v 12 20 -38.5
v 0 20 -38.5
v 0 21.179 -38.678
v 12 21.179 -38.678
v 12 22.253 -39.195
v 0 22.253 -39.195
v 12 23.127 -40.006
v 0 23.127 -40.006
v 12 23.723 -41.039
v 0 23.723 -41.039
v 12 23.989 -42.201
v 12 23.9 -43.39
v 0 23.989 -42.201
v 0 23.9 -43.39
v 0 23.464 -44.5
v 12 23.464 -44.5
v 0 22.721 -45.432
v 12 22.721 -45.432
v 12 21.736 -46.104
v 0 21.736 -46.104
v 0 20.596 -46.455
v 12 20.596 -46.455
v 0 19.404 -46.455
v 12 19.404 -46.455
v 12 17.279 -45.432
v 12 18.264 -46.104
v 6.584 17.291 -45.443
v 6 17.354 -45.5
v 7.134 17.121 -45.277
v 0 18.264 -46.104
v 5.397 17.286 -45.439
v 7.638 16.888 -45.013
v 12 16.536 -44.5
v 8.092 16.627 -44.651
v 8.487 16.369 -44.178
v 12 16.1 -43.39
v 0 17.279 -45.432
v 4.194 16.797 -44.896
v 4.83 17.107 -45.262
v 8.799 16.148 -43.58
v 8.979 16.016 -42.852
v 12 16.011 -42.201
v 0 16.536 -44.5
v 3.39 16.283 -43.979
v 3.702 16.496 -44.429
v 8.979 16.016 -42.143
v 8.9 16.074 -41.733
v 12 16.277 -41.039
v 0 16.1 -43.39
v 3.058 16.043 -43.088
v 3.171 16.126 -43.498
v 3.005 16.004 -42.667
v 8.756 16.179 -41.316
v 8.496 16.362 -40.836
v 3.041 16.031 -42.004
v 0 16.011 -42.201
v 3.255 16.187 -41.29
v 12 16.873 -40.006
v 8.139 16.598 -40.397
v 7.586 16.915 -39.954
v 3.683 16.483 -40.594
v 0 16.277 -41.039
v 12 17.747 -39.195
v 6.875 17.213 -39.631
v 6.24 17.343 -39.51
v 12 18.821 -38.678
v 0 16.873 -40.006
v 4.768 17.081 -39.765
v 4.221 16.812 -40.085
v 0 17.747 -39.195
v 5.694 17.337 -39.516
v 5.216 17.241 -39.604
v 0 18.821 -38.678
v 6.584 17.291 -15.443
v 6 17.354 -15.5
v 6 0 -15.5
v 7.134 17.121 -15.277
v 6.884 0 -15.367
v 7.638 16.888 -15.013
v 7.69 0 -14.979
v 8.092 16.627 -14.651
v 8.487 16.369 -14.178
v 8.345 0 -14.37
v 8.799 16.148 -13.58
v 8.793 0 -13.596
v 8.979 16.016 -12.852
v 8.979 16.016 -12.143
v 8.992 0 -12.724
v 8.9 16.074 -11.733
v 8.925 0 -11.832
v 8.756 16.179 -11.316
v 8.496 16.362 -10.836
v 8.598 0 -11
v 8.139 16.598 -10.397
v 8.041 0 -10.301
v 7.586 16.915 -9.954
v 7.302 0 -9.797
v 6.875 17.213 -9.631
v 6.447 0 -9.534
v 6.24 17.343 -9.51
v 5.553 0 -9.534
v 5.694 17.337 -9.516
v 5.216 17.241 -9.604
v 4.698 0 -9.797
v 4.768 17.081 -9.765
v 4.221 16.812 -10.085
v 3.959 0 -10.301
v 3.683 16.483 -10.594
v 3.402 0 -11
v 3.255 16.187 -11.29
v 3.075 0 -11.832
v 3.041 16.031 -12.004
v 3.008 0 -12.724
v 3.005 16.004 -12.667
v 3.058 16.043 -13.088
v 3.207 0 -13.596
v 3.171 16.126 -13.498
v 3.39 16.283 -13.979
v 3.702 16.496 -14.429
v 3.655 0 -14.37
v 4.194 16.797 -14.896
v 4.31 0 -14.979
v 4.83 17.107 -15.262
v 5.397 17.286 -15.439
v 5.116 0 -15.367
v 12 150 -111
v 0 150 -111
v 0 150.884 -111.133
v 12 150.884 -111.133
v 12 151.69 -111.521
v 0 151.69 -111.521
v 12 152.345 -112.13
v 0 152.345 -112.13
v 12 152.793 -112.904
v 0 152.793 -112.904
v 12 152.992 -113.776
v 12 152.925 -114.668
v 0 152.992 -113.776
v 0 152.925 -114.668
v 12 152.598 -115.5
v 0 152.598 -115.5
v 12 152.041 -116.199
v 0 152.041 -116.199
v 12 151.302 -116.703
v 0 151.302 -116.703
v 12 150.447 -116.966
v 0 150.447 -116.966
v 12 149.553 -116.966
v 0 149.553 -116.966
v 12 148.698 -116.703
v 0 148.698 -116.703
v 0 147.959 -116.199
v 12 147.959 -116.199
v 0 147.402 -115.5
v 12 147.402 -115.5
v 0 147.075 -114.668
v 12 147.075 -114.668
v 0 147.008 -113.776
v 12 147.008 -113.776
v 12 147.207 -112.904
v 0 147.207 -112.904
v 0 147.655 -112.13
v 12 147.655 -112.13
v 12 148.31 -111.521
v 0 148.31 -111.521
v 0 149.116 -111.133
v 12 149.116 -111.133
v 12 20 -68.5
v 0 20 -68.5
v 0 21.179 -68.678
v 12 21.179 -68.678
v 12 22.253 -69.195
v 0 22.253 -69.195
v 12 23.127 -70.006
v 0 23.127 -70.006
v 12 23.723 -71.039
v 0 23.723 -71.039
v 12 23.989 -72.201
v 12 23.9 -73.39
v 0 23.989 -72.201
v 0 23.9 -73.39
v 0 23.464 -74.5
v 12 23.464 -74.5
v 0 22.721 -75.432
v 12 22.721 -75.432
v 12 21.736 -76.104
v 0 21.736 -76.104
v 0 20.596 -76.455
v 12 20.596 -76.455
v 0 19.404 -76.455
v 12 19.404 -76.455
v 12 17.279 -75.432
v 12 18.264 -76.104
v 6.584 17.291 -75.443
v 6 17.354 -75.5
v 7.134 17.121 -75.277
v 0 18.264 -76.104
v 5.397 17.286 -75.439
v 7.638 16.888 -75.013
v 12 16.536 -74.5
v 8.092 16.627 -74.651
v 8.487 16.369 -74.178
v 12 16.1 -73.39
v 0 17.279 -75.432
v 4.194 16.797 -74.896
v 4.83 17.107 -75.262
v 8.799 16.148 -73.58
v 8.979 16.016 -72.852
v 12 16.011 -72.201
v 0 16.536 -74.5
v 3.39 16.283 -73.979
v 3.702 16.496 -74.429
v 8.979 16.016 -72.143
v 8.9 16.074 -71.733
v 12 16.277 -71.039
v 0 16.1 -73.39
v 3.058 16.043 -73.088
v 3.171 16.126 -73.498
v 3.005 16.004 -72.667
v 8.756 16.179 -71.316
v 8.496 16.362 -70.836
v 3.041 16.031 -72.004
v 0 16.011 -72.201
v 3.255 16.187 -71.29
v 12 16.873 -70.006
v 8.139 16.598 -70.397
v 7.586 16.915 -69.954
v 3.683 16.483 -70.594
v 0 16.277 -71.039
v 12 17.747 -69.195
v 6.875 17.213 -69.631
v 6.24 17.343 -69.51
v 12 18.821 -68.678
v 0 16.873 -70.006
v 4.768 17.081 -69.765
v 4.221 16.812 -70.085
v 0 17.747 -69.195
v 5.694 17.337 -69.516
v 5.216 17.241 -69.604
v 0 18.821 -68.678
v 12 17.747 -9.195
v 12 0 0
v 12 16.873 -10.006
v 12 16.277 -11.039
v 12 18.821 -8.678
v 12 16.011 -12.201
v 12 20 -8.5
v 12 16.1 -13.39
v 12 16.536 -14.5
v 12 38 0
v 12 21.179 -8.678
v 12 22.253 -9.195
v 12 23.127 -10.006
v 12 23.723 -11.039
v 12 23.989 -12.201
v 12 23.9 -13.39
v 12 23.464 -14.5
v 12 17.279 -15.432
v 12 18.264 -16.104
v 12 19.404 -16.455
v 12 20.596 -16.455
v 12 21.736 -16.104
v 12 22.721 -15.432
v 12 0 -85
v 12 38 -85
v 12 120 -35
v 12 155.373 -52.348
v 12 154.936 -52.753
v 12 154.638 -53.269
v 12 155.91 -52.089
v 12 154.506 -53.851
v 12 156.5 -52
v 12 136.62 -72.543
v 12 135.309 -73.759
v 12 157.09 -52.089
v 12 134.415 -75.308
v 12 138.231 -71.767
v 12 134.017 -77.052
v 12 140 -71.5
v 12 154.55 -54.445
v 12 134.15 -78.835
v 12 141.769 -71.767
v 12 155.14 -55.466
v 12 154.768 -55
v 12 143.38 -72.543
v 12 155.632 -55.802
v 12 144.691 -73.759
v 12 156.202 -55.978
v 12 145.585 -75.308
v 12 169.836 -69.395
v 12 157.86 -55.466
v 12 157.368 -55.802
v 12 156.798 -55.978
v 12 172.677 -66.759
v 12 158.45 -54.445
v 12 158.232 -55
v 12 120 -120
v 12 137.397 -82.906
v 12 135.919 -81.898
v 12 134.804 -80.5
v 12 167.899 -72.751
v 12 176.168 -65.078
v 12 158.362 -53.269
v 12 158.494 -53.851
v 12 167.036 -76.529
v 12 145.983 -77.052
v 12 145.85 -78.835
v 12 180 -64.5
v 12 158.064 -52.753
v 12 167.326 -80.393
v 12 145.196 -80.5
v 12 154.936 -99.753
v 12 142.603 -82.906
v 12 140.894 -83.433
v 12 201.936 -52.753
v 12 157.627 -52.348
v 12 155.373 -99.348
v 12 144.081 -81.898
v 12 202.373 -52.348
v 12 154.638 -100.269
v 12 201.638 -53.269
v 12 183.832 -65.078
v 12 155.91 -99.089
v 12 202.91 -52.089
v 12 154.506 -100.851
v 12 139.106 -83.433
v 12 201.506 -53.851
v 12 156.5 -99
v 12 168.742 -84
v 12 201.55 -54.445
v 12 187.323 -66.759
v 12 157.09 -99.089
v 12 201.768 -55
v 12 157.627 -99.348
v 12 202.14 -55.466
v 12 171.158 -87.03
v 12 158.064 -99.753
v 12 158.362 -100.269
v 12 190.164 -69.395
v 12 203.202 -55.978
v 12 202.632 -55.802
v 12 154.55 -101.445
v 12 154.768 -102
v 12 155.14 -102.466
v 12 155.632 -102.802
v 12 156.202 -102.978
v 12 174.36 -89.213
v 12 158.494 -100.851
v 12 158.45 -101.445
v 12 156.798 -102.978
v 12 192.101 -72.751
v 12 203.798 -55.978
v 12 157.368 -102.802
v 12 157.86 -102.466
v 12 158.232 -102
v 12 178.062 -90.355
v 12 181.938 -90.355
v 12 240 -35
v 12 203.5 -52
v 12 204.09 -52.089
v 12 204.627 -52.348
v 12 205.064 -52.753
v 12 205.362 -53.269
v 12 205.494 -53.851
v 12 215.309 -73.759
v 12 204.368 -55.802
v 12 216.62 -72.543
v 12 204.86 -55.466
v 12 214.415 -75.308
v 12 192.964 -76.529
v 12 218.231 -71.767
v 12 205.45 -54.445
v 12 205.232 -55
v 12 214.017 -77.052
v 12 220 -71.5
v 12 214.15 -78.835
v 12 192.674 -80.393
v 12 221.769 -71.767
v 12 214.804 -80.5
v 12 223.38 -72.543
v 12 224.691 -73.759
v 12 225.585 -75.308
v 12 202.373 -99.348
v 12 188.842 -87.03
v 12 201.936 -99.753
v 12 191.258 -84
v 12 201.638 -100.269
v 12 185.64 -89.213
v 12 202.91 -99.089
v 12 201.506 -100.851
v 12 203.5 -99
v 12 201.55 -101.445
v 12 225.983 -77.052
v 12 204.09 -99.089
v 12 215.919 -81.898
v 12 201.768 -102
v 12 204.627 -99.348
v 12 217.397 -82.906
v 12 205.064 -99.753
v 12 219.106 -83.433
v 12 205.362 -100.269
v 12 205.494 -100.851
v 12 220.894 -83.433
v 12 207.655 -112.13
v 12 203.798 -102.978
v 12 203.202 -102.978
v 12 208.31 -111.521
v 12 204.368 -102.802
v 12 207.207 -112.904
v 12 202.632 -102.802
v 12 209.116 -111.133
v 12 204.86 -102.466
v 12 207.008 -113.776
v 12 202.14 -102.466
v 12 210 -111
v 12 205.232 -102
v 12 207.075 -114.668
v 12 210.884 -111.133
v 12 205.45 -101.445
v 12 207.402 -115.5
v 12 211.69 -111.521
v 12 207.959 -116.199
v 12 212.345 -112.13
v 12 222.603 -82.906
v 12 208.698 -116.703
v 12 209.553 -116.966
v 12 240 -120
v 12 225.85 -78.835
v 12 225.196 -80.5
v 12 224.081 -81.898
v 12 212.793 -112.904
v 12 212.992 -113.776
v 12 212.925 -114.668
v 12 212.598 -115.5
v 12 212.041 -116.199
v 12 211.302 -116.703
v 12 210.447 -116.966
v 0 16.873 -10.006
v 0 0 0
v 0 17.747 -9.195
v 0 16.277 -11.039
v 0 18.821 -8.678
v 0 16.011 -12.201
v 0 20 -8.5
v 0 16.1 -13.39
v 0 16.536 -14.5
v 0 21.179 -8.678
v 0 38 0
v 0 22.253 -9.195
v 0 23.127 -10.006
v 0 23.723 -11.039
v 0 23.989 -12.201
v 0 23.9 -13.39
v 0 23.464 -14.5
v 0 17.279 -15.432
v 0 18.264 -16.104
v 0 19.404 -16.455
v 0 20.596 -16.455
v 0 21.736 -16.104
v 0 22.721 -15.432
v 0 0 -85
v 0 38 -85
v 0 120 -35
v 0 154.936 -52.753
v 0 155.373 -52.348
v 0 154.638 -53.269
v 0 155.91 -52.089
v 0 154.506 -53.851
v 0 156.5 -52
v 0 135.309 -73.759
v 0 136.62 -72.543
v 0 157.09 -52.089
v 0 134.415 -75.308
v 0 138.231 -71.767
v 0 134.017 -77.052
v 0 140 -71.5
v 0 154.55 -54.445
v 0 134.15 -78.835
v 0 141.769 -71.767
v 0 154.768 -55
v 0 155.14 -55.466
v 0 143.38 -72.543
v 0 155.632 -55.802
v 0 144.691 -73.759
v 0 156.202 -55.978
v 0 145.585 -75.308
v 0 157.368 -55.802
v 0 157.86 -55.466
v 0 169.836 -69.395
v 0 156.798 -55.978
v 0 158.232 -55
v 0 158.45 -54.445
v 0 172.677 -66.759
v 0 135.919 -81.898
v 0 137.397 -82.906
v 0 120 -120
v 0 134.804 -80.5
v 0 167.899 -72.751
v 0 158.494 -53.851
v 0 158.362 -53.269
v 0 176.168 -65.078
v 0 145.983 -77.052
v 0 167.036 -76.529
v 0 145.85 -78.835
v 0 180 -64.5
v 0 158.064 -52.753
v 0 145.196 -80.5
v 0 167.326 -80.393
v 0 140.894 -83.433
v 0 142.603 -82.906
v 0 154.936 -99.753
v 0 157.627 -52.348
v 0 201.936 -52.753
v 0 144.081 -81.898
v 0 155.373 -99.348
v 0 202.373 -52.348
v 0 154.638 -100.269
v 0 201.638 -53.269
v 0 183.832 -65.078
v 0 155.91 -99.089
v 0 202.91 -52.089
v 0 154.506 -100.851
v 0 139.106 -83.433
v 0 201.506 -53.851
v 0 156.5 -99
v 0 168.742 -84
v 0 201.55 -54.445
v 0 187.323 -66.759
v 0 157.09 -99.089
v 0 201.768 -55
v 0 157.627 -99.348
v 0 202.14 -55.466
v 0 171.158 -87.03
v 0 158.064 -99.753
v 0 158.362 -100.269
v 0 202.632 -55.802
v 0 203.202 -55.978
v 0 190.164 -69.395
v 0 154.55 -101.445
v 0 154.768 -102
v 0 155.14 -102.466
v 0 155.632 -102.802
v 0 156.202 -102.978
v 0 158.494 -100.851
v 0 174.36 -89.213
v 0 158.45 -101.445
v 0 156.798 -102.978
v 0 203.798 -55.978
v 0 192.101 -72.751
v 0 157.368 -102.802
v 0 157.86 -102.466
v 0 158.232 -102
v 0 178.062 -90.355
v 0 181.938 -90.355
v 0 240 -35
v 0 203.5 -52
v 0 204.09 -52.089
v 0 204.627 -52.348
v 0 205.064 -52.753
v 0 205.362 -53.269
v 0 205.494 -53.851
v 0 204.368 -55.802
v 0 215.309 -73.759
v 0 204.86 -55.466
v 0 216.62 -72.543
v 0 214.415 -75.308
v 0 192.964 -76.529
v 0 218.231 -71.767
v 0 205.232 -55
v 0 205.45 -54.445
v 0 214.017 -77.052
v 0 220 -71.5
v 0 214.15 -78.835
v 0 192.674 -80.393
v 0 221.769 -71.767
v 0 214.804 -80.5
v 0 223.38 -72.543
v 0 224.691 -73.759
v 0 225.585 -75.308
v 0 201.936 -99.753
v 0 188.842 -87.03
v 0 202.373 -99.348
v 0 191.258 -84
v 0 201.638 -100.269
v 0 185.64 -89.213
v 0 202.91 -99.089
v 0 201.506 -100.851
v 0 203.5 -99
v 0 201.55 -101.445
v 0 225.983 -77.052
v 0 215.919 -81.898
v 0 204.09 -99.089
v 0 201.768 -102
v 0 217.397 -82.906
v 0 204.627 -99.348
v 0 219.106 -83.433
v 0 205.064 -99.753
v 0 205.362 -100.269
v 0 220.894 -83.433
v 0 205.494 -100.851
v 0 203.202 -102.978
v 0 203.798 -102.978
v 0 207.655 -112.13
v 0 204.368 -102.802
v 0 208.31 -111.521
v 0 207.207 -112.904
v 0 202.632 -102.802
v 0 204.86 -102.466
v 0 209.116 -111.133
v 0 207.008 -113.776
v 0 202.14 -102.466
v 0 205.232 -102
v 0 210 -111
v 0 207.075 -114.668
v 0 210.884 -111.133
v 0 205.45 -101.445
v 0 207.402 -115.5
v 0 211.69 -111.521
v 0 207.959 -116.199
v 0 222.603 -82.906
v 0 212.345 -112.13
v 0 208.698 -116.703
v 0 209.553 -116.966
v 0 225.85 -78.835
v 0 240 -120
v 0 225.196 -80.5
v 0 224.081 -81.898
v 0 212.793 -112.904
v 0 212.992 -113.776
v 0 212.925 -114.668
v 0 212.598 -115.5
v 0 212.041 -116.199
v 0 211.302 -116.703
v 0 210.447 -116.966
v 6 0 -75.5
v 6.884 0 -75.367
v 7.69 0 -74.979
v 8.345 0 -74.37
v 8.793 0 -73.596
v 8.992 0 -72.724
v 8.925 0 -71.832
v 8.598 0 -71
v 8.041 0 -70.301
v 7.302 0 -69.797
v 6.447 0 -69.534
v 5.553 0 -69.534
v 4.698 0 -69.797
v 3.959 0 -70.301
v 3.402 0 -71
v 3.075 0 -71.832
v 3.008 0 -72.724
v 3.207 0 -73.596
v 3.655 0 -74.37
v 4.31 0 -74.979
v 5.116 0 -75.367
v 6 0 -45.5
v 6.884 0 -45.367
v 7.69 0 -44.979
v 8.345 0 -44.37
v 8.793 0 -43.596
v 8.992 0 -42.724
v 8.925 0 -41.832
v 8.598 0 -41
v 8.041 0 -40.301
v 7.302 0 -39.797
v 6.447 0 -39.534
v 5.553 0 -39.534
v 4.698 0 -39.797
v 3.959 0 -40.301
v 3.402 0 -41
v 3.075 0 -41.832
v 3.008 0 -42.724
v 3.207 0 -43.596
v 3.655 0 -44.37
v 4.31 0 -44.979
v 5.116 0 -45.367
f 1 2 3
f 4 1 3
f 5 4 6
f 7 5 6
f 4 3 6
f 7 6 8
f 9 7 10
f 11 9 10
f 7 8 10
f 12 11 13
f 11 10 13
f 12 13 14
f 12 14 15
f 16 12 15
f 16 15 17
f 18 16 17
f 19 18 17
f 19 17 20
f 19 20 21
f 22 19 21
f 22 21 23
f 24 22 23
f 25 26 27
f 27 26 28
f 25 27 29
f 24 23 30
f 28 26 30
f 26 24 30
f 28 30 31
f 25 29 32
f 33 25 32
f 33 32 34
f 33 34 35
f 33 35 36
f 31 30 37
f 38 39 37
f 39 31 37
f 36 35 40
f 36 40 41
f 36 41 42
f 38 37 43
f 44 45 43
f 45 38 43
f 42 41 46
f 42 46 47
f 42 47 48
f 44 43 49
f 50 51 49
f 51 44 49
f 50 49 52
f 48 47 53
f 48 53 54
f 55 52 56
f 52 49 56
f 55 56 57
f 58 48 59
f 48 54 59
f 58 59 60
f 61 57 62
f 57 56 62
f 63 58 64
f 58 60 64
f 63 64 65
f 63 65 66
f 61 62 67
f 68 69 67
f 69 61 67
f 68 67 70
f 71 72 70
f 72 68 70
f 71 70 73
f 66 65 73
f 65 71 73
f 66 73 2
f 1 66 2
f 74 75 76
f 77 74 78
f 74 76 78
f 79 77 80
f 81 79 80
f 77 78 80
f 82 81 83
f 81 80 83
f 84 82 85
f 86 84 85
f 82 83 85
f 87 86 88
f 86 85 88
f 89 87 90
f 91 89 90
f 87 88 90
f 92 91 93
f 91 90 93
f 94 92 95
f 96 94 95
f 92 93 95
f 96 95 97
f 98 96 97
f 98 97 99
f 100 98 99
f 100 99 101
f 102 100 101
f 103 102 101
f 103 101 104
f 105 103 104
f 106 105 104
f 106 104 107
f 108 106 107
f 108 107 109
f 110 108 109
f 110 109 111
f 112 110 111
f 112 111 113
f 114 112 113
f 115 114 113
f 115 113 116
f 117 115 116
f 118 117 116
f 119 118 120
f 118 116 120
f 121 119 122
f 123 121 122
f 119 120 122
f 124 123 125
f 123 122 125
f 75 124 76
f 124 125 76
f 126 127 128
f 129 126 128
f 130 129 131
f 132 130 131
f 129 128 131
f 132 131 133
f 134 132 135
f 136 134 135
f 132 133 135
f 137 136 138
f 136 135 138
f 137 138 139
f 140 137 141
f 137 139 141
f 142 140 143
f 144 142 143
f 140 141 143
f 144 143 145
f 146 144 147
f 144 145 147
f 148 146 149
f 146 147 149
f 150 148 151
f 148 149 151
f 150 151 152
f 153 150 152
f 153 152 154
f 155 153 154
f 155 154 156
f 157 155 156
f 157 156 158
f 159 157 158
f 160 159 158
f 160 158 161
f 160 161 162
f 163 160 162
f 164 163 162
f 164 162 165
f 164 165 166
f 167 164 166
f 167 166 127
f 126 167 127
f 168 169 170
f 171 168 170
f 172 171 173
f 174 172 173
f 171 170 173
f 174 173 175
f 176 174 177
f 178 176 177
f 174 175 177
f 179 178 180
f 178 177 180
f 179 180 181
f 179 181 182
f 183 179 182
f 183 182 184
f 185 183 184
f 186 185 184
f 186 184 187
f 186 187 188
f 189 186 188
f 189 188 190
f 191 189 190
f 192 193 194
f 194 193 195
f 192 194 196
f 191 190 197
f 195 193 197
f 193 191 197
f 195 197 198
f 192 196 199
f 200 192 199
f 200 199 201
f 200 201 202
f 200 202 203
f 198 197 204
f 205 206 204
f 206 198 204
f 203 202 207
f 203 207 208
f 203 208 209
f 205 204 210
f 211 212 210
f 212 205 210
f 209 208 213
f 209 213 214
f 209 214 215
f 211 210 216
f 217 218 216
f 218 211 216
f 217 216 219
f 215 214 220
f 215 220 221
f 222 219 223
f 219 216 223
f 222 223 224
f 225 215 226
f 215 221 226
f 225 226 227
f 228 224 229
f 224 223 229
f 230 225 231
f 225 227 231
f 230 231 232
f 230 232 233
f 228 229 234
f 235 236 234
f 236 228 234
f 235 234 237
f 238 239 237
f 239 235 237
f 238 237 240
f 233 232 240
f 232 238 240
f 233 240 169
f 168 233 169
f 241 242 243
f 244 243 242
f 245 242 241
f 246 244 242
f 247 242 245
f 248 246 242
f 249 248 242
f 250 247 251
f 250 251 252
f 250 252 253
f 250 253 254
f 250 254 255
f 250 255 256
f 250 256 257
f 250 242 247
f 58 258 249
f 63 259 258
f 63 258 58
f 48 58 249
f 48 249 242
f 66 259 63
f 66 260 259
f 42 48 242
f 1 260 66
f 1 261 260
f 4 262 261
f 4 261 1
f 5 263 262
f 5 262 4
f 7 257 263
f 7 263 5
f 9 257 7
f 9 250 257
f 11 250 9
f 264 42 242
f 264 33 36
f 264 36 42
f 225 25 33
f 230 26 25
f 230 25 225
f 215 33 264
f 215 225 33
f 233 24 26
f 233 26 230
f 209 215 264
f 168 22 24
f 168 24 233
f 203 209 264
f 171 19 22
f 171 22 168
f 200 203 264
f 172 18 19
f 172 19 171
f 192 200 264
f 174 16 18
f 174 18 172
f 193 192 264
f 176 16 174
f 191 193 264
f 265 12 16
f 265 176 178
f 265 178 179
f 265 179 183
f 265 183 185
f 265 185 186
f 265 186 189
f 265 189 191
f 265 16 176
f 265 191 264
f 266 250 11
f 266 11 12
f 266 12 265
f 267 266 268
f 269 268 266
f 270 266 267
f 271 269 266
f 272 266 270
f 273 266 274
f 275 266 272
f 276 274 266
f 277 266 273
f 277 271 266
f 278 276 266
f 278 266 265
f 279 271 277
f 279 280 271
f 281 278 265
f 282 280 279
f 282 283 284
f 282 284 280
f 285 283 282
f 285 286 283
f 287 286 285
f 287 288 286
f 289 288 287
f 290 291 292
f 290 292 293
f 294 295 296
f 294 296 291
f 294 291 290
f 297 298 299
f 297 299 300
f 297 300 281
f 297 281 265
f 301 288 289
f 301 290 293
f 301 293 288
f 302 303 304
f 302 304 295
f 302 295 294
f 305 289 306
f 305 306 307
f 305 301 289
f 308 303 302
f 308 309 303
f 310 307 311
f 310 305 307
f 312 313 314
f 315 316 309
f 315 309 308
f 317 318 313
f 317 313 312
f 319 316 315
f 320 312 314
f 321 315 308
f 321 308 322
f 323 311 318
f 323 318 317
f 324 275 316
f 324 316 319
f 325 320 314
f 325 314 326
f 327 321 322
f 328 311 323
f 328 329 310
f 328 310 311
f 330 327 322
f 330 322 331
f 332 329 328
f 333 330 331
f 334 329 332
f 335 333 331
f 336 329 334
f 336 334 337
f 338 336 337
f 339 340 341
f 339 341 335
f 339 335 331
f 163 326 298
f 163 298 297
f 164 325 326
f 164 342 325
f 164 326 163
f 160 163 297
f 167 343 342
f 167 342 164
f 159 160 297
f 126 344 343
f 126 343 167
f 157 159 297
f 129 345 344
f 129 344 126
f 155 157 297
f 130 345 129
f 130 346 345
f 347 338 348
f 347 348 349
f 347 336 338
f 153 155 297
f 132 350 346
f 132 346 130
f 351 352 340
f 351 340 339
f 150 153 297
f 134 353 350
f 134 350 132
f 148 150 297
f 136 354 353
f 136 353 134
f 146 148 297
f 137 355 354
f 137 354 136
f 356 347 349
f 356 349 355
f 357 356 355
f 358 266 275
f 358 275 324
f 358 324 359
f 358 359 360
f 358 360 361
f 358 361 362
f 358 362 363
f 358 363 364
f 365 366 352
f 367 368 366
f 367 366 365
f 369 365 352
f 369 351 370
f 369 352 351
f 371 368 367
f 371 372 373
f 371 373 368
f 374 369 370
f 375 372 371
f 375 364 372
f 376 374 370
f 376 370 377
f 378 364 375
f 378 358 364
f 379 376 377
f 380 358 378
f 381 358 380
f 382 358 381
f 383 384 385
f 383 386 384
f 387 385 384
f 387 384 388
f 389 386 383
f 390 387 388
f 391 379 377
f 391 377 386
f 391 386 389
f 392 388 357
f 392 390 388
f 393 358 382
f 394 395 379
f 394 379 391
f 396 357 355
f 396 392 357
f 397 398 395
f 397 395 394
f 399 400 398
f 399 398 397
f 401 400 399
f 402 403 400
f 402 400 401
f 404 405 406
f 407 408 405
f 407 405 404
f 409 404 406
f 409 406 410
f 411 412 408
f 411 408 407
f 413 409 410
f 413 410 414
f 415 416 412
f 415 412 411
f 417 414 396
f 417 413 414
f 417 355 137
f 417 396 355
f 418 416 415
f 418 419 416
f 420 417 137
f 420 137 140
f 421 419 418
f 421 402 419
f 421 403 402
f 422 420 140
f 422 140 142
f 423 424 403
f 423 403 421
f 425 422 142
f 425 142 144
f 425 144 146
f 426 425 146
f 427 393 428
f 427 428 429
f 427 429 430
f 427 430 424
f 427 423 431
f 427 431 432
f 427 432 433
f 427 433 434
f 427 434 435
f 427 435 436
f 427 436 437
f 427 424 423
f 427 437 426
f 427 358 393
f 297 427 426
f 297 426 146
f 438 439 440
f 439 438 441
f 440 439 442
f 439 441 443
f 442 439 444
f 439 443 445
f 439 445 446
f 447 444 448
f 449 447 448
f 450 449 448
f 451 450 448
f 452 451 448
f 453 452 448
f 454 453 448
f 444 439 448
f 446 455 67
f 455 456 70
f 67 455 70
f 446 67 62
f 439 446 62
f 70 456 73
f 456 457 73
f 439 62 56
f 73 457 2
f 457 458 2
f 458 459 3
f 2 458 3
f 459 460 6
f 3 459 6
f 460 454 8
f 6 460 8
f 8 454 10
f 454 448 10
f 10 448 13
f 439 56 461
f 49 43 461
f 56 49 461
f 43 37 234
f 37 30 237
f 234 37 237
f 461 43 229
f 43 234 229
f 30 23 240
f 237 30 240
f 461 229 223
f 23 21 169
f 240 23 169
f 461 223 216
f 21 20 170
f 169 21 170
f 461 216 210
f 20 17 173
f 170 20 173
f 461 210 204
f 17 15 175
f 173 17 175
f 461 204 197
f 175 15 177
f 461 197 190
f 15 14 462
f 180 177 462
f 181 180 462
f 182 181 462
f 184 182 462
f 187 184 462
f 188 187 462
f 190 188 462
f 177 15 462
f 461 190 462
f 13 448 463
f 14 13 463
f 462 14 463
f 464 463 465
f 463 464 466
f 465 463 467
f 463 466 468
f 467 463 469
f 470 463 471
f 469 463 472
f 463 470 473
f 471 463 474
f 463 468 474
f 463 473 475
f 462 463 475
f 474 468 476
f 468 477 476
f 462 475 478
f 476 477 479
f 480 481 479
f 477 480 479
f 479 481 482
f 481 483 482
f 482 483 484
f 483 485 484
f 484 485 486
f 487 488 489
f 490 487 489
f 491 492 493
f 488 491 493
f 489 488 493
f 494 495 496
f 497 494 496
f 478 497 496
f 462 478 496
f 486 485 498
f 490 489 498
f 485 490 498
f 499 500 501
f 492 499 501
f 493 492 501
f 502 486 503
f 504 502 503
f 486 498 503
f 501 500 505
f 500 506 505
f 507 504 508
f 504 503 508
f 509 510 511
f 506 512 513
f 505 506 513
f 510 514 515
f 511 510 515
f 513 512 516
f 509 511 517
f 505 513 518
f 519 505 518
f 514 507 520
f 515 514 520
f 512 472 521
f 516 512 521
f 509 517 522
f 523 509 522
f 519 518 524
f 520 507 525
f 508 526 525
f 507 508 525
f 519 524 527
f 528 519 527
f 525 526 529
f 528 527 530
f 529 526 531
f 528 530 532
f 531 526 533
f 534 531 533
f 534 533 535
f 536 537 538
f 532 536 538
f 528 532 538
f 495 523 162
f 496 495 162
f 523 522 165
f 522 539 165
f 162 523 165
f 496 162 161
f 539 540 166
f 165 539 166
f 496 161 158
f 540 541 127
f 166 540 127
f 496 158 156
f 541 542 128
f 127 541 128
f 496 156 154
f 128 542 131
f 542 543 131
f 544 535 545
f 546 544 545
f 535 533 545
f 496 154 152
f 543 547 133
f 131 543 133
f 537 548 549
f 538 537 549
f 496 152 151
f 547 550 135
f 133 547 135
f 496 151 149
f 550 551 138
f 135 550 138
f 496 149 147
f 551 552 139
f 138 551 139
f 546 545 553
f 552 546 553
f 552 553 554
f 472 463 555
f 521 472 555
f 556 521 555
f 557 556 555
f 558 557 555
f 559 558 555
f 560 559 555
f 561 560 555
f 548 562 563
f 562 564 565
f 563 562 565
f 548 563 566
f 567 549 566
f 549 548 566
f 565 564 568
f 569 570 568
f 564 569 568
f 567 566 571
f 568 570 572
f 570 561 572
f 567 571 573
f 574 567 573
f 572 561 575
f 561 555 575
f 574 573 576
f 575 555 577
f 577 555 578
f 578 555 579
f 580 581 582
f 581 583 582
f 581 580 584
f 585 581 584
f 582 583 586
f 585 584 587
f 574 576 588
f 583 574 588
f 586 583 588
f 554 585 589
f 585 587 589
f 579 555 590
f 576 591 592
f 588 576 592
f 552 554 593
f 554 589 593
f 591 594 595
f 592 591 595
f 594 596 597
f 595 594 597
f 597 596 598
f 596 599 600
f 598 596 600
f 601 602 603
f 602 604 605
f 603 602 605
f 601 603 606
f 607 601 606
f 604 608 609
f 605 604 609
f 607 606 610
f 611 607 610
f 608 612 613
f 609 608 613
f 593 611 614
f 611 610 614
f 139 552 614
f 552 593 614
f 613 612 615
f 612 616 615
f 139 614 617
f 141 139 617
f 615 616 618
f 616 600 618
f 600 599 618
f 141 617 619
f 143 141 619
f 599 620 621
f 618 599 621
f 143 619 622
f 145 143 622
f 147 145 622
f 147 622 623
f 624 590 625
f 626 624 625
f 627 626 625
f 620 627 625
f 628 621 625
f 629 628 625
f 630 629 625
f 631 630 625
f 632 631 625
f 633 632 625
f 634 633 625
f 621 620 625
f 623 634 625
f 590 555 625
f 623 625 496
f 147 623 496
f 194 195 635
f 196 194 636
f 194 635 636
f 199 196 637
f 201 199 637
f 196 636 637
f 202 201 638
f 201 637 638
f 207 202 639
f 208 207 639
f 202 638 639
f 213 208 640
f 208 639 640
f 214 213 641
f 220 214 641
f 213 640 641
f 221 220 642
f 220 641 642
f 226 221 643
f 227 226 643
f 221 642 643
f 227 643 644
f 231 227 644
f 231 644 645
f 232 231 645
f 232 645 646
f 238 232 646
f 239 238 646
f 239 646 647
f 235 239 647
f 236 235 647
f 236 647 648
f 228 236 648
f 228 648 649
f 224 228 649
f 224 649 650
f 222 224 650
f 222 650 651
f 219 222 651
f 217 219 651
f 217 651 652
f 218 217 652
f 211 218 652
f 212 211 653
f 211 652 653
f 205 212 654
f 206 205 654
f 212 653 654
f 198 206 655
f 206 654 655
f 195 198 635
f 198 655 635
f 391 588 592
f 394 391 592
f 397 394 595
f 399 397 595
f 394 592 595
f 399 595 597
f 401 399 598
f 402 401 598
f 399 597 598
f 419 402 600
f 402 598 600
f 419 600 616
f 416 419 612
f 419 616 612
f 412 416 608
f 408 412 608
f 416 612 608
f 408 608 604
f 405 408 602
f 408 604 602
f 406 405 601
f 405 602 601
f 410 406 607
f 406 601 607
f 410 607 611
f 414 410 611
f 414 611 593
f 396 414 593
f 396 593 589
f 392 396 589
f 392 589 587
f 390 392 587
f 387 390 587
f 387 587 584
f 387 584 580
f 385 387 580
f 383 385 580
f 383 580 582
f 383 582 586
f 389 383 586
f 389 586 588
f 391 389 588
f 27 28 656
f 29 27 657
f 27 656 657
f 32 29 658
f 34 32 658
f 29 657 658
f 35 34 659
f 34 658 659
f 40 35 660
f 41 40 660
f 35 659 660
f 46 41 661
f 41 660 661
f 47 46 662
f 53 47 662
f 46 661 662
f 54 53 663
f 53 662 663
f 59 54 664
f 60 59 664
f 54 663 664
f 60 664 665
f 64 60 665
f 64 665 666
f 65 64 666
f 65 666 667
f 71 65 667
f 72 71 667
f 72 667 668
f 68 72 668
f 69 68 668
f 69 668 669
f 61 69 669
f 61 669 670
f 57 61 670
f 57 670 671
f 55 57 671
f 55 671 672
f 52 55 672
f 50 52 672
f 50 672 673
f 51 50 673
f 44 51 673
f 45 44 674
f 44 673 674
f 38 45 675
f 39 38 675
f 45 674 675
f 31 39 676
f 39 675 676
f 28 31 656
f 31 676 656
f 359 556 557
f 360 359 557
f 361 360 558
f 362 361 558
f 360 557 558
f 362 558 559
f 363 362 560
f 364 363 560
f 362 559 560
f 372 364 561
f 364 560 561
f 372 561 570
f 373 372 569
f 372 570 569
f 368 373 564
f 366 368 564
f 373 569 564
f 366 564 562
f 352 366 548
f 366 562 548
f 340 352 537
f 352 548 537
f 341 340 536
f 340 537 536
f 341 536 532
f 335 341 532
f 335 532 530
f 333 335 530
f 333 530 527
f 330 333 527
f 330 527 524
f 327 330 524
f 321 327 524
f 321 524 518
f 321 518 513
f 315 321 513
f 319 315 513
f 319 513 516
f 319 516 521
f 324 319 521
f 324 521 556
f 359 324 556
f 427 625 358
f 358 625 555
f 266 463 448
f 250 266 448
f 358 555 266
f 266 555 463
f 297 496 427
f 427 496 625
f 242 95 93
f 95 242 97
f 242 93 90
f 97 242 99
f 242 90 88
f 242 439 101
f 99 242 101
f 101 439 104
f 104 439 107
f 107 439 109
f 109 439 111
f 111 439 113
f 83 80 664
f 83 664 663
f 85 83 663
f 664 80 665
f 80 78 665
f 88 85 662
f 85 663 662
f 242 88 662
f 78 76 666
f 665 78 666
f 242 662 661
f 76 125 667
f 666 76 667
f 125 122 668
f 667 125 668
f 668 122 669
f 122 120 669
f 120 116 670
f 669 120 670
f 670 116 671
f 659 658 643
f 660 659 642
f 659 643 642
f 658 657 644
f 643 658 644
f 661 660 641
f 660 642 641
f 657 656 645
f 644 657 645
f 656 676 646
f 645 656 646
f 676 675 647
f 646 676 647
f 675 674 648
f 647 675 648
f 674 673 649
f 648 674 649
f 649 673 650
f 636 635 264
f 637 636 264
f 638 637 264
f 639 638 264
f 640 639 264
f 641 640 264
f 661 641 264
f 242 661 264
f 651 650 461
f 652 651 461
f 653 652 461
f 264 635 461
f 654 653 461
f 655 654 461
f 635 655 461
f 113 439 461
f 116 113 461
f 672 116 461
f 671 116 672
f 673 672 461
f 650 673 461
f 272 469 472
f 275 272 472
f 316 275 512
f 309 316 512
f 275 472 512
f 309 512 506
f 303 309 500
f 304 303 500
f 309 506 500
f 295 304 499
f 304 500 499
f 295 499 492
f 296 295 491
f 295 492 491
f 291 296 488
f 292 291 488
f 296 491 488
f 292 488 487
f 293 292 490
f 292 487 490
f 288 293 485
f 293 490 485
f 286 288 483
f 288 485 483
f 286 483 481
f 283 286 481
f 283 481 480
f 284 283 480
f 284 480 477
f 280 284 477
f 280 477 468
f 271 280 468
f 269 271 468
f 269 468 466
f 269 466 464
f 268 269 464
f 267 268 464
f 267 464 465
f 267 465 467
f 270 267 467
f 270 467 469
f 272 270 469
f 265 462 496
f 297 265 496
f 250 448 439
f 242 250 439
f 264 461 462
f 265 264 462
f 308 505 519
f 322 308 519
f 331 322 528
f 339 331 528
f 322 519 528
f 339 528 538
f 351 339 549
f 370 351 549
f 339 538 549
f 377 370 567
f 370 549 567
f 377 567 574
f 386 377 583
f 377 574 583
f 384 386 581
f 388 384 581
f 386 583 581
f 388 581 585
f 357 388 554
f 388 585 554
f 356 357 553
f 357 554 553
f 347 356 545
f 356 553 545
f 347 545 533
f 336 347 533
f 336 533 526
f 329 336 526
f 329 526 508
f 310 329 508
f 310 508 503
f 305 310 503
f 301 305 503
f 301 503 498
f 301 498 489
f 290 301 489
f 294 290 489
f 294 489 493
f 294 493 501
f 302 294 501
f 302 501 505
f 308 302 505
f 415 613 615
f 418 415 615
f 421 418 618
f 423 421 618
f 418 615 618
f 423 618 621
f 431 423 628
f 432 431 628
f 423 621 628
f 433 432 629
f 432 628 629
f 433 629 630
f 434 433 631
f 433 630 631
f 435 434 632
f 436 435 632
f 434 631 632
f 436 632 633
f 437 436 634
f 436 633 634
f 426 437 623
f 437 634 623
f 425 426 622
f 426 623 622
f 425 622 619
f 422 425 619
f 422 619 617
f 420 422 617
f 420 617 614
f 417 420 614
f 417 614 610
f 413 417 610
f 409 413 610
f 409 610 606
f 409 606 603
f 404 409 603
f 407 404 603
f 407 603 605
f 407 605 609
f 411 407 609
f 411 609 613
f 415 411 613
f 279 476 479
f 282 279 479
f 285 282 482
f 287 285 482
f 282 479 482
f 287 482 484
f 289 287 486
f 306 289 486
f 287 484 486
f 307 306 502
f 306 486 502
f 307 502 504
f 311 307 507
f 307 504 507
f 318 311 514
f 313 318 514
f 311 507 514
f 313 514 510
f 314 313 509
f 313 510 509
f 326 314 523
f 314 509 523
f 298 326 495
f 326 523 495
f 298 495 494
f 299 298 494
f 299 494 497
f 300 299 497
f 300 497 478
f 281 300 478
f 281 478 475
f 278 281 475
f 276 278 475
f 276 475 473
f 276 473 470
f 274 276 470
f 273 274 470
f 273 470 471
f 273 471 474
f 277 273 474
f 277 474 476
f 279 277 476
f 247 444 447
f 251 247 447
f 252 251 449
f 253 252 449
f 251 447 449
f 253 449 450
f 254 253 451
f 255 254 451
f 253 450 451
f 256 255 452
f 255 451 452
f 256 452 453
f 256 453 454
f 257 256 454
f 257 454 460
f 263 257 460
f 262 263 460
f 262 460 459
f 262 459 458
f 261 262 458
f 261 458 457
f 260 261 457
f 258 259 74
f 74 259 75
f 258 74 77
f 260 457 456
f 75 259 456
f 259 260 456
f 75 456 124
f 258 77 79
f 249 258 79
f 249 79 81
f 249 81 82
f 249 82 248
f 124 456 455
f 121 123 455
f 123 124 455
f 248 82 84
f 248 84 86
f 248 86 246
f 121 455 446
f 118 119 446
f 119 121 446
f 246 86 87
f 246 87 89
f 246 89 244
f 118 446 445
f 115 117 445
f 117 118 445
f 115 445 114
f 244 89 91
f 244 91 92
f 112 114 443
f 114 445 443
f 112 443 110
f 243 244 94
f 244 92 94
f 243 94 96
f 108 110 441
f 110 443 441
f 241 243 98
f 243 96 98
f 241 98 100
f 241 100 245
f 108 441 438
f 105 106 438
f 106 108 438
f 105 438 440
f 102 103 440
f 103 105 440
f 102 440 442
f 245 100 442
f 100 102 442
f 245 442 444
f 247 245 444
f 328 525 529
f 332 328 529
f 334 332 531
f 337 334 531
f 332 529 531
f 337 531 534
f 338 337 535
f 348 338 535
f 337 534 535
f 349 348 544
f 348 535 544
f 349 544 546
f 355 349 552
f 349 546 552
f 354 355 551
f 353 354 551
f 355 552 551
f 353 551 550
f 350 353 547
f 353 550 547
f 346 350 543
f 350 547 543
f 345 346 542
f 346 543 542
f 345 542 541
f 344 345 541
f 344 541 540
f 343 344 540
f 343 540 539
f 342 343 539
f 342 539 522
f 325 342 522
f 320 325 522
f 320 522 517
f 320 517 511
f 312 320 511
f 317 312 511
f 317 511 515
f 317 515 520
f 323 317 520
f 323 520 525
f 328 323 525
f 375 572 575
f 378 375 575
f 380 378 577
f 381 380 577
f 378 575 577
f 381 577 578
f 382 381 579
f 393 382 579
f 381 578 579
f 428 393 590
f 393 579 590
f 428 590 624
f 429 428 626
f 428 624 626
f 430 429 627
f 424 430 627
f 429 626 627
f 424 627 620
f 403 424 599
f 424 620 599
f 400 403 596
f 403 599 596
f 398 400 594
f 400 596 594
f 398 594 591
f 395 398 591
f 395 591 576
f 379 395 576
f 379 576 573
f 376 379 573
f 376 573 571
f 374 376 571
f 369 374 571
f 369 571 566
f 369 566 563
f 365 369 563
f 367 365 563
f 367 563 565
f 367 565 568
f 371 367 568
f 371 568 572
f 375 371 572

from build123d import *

# Parameters (mm, degrees)
BOSS_EXTRUDE1_DEPTH = 12
CUT_EXTRUDE1_REACH  = 270.596
SKETCH2_R           = 4
CUT_EXTRUDE2_REACH  = 270.596
SKETCH3_R           = 3
CUT_EXTRUDE3_REACH  = 270.596
SKETCH4_R           = 13
SKETCH4_R_2         = 6
SKETCH4_R_3         = 2
CUT_EXTRUDE4_REACH  = 270.596
SKETCH5_R           = 3


with BuildPart() as part:
    # Sketch1 → Boss-Extrude1 (new body)
    with BuildSketch(Plane(origin=(0, 0, 0), x_dir=(0, 0, -1), z_dir=(1, 0, 0))):
        Polygon((120, 240), (35, 240), (35, 120), (0, 38), (0, 0), (85, 0), (85, 38), (120, 120), align=None)
    extrude(amount=BOSS_EXTRUDE1_DEPTH)

    # Sketch2 → Cut-Extrude1 (cut, up to next)
    with BuildSketch(Plane.ZY, mode=Mode.PRIVATE) as cut_extrude1_sk1:
        with Locations((-42.5, 20)):
            Circle(SKETCH2_R)
    cut_extrude1_tool1 = extrude(cut_extrude1_sk1.sketch, amount=-CUT_EXTRUDE1_REACH, mode=Mode.PRIVATE) & part.part
    # Sketch2 → Cut-Extrude1 (cut, up to next)
    with BuildSketch(Plane.ZY, mode=Mode.PRIVATE) as cut_extrude1_sk2:
        with Locations((-72.5, 20)):
            Circle(SKETCH2_R)
    cut_extrude1_tool2 = extrude(cut_extrude1_sk2.sketch, amount=-CUT_EXTRUDE1_REACH, mode=Mode.PRIVATE) & part.part
    # Sketch2 → Cut-Extrude1 (cut, up to next)
    with BuildSketch(Plane.ZY, mode=Mode.PRIVATE) as cut_extrude1_sk3:
        with Locations((-12.5, 20)):
            Circle(SKETCH2_R)
    cut_extrude1_tool3 = extrude(cut_extrude1_sk3.sketch, amount=-CUT_EXTRUDE1_REACH, mode=Mode.PRIVATE) & part.part
    add(cut_extrude1_tool1.solids().sort_by_distance((0, 20, -42.5))[0], mode=Mode.SUBTRACT)
    add(cut_extrude1_tool2.solids().sort_by_distance((0, 20, -72.5))[0], mode=Mode.SUBTRACT)
    add(cut_extrude1_tool3.solids().sort_by_distance((0, 20, -12.5))[0], mode=Mode.SUBTRACT)

    # Sketch3 → Cut-Extrude2 (cut, up to next)
    with BuildSketch(Plane.XZ, mode=Mode.PRIVATE) as cut_extrude2_sk1:
        with Locations(Location((6, -42.5, 0), (0, 0, 270))):
            Circle(SKETCH3_R)
    cut_extrude2_tool1 = extrude(cut_extrude2_sk1.sketch, amount=-CUT_EXTRUDE2_REACH, mode=Mode.PRIVATE) & part.part
    # Sketch3 → Cut-Extrude2 (cut, up to next)
    with BuildSketch(Plane.XZ, mode=Mode.PRIVATE) as cut_extrude2_sk2:
        with Locations(Location((6, -72.5, 0), (0, 0, 270))):
            Circle(SKETCH3_R)
    cut_extrude2_tool2 = extrude(cut_extrude2_sk2.sketch, amount=-CUT_EXTRUDE2_REACH, mode=Mode.PRIVATE) & part.part
    # Sketch3 → Cut-Extrude2 (cut, up to next)
    with BuildSketch(Plane.XZ, mode=Mode.PRIVATE) as cut_extrude2_sk3:
        with Locations(Location((6, -12.5, 0), (0, 0, 270))):
            Circle(SKETCH3_R)
    cut_extrude2_tool3 = extrude(cut_extrude2_sk3.sketch, amount=-CUT_EXTRUDE2_REACH, mode=Mode.PRIVATE) & part.part
    add(cut_extrude2_tool1.solids().sort_by_distance((6, 0, -42.5))[0], mode=Mode.SUBTRACT)
    add(cut_extrude2_tool2.solids().sort_by_distance((6, 0, -72.5))[0], mode=Mode.SUBTRACT)
    add(cut_extrude2_tool3.solids().sort_by_distance((6, 0, -12.5))[0], mode=Mode.SUBTRACT)

    # Sketch4 → Cut-Extrude3 (cut, up to next)
    with BuildSketch(Plane.ZY, mode=Mode.PRIVATE) as cut_extrude3_sk1:
        with Locations((-77.5, 180)):
            Circle(SKETCH4_R)
    cut_extrude3_tool1 = extrude(cut_extrude3_sk1.sketch, amount=-CUT_EXTRUDE3_REACH, mode=Mode.PRIVATE) & part.part
    # Sketch4 → Cut-Extrude3 (cut, up to next)
    with BuildSketch(Plane.ZY, mode=Mode.PRIVATE) as cut_extrude3_sk2:
        with Locations((-77.5, 220)):
            Circle(SKETCH4_R_2)
    cut_extrude3_tool2 = extrude(cut_extrude3_sk2.sketch, amount=-CUT_EXTRUDE3_REACH, mode=Mode.PRIVATE) & part.part
    # Sketch4 → Cut-Extrude3 (cut, up to next)
    with BuildSketch(Plane.ZY, mode=Mode.PRIVATE) as cut_extrude3_sk3:
        with Locations((-77.5, 140)):
            Circle(SKETCH4_R_2)
    cut_extrude3_tool3 = extrude(cut_extrude3_sk3.sketch, amount=-CUT_EXTRUDE3_REACH, mode=Mode.PRIVATE) & part.part
    # Sketch4 → Cut-Extrude3 (cut, up to next)
    with BuildSketch(Plane.ZY, mode=Mode.PRIVATE) as cut_extrude3_sk4:
        with Locations((-101, 203.5)):
            Circle(SKETCH4_R_3)
    cut_extrude3_tool4 = extrude(cut_extrude3_sk4.sketch, amount=-CUT_EXTRUDE3_REACH, mode=Mode.PRIVATE) & part.part
    # Sketch4 → Cut-Extrude3 (cut, up to next)
    with BuildSketch(Plane.ZY, mode=Mode.PRIVATE) as cut_extrude3_sk5:
        with Locations((-54, 203.5)):
            Circle(SKETCH4_R_3)
    cut_extrude3_tool5 = extrude(cut_extrude3_sk5.sketch, amount=-CUT_EXTRUDE3_REACH, mode=Mode.PRIVATE) & part.part
    # Sketch4 → Cut-Extrude3 (cut, up to next)
    with BuildSketch(Plane.ZY, mode=Mode.PRIVATE) as cut_extrude3_sk6:
        with Locations((-101, 156.5)):
            Circle(SKETCH4_R_3)
    cut_extrude3_tool6 = extrude(cut_extrude3_sk6.sketch, amount=-CUT_EXTRUDE3_REACH, mode=Mode.PRIVATE) & part.part
    # Sketch4 → Cut-Extrude3 (cut, up to next)
    with BuildSketch(Plane.ZY, mode=Mode.PRIVATE) as cut_extrude3_sk7:
        with Locations((-54, 156.5)):
            Circle(SKETCH4_R_3)
    cut_extrude3_tool7 = extrude(cut_extrude3_sk7.sketch, amount=-CUT_EXTRUDE3_REACH, mode=Mode.PRIVATE) & part.part
    add(cut_extrude3_tool1.solids().sort_by_distance((0, 180, -77.5))[0], mode=Mode.SUBTRACT)
    add(cut_extrude3_tool2.solids().sort_by_distance((0, 220, -77.5))[0], mode=Mode.SUBTRACT)
    add(cut_extrude3_tool3.solids().sort_by_distance((0, 140, -77.5))[0], mode=Mode.SUBTRACT)
    add(cut_extrude3_tool4.solids().sort_by_distance((0, 203.5, -101))[0], mode=Mode.SUBTRACT)
    add(cut_extrude3_tool5.solids().sort_by_distance((0, 203.5, -54))[0], mode=Mode.SUBTRACT)
    add(cut_extrude3_tool6.solids().sort_by_distance((0, 156.5, -101))[0], mode=Mode.SUBTRACT)
    add(cut_extrude3_tool7.solids().sort_by_distance((0, 156.5, -54))[0], mode=Mode.SUBTRACT)

    # Sketch5 → Cut-Extrude4 (cut, up to next)
    with BuildSketch(Plane.ZY, mode=Mode.PRIVATE) as cut_extrude4_sk1:
        with Locations((-114, 210)):
            Circle(SKETCH5_R)
    cut_extrude4_tool1 = extrude(cut_extrude4_sk1.sketch, amount=-CUT_EXTRUDE4_REACH, mode=Mode.PRIVATE) & part.part
    # Sketch5 → Cut-Extrude4 (cut, up to next)
    with BuildSketch(Plane.ZY, mode=Mode.PRIVATE) as cut_extrude4_sk2:
        with Locations((-114, 150)):
            Circle(SKETCH5_R)
    cut_extrude4_tool2 = extrude(cut_extrude4_sk2.sketch, amount=-CUT_EXTRUDE4_REACH, mode=Mode.PRIVATE) & part.part
    add(cut_extrude4_tool1.solids().sort_by_distance((0, 210, -114))[0], mode=Mode.SUBTRACT)
    add(cut_extrude4_tool2.solids().sort_by_distance((0, 150, -114))[0], mode=Mode.SUBTRACT)


solid = part.part
